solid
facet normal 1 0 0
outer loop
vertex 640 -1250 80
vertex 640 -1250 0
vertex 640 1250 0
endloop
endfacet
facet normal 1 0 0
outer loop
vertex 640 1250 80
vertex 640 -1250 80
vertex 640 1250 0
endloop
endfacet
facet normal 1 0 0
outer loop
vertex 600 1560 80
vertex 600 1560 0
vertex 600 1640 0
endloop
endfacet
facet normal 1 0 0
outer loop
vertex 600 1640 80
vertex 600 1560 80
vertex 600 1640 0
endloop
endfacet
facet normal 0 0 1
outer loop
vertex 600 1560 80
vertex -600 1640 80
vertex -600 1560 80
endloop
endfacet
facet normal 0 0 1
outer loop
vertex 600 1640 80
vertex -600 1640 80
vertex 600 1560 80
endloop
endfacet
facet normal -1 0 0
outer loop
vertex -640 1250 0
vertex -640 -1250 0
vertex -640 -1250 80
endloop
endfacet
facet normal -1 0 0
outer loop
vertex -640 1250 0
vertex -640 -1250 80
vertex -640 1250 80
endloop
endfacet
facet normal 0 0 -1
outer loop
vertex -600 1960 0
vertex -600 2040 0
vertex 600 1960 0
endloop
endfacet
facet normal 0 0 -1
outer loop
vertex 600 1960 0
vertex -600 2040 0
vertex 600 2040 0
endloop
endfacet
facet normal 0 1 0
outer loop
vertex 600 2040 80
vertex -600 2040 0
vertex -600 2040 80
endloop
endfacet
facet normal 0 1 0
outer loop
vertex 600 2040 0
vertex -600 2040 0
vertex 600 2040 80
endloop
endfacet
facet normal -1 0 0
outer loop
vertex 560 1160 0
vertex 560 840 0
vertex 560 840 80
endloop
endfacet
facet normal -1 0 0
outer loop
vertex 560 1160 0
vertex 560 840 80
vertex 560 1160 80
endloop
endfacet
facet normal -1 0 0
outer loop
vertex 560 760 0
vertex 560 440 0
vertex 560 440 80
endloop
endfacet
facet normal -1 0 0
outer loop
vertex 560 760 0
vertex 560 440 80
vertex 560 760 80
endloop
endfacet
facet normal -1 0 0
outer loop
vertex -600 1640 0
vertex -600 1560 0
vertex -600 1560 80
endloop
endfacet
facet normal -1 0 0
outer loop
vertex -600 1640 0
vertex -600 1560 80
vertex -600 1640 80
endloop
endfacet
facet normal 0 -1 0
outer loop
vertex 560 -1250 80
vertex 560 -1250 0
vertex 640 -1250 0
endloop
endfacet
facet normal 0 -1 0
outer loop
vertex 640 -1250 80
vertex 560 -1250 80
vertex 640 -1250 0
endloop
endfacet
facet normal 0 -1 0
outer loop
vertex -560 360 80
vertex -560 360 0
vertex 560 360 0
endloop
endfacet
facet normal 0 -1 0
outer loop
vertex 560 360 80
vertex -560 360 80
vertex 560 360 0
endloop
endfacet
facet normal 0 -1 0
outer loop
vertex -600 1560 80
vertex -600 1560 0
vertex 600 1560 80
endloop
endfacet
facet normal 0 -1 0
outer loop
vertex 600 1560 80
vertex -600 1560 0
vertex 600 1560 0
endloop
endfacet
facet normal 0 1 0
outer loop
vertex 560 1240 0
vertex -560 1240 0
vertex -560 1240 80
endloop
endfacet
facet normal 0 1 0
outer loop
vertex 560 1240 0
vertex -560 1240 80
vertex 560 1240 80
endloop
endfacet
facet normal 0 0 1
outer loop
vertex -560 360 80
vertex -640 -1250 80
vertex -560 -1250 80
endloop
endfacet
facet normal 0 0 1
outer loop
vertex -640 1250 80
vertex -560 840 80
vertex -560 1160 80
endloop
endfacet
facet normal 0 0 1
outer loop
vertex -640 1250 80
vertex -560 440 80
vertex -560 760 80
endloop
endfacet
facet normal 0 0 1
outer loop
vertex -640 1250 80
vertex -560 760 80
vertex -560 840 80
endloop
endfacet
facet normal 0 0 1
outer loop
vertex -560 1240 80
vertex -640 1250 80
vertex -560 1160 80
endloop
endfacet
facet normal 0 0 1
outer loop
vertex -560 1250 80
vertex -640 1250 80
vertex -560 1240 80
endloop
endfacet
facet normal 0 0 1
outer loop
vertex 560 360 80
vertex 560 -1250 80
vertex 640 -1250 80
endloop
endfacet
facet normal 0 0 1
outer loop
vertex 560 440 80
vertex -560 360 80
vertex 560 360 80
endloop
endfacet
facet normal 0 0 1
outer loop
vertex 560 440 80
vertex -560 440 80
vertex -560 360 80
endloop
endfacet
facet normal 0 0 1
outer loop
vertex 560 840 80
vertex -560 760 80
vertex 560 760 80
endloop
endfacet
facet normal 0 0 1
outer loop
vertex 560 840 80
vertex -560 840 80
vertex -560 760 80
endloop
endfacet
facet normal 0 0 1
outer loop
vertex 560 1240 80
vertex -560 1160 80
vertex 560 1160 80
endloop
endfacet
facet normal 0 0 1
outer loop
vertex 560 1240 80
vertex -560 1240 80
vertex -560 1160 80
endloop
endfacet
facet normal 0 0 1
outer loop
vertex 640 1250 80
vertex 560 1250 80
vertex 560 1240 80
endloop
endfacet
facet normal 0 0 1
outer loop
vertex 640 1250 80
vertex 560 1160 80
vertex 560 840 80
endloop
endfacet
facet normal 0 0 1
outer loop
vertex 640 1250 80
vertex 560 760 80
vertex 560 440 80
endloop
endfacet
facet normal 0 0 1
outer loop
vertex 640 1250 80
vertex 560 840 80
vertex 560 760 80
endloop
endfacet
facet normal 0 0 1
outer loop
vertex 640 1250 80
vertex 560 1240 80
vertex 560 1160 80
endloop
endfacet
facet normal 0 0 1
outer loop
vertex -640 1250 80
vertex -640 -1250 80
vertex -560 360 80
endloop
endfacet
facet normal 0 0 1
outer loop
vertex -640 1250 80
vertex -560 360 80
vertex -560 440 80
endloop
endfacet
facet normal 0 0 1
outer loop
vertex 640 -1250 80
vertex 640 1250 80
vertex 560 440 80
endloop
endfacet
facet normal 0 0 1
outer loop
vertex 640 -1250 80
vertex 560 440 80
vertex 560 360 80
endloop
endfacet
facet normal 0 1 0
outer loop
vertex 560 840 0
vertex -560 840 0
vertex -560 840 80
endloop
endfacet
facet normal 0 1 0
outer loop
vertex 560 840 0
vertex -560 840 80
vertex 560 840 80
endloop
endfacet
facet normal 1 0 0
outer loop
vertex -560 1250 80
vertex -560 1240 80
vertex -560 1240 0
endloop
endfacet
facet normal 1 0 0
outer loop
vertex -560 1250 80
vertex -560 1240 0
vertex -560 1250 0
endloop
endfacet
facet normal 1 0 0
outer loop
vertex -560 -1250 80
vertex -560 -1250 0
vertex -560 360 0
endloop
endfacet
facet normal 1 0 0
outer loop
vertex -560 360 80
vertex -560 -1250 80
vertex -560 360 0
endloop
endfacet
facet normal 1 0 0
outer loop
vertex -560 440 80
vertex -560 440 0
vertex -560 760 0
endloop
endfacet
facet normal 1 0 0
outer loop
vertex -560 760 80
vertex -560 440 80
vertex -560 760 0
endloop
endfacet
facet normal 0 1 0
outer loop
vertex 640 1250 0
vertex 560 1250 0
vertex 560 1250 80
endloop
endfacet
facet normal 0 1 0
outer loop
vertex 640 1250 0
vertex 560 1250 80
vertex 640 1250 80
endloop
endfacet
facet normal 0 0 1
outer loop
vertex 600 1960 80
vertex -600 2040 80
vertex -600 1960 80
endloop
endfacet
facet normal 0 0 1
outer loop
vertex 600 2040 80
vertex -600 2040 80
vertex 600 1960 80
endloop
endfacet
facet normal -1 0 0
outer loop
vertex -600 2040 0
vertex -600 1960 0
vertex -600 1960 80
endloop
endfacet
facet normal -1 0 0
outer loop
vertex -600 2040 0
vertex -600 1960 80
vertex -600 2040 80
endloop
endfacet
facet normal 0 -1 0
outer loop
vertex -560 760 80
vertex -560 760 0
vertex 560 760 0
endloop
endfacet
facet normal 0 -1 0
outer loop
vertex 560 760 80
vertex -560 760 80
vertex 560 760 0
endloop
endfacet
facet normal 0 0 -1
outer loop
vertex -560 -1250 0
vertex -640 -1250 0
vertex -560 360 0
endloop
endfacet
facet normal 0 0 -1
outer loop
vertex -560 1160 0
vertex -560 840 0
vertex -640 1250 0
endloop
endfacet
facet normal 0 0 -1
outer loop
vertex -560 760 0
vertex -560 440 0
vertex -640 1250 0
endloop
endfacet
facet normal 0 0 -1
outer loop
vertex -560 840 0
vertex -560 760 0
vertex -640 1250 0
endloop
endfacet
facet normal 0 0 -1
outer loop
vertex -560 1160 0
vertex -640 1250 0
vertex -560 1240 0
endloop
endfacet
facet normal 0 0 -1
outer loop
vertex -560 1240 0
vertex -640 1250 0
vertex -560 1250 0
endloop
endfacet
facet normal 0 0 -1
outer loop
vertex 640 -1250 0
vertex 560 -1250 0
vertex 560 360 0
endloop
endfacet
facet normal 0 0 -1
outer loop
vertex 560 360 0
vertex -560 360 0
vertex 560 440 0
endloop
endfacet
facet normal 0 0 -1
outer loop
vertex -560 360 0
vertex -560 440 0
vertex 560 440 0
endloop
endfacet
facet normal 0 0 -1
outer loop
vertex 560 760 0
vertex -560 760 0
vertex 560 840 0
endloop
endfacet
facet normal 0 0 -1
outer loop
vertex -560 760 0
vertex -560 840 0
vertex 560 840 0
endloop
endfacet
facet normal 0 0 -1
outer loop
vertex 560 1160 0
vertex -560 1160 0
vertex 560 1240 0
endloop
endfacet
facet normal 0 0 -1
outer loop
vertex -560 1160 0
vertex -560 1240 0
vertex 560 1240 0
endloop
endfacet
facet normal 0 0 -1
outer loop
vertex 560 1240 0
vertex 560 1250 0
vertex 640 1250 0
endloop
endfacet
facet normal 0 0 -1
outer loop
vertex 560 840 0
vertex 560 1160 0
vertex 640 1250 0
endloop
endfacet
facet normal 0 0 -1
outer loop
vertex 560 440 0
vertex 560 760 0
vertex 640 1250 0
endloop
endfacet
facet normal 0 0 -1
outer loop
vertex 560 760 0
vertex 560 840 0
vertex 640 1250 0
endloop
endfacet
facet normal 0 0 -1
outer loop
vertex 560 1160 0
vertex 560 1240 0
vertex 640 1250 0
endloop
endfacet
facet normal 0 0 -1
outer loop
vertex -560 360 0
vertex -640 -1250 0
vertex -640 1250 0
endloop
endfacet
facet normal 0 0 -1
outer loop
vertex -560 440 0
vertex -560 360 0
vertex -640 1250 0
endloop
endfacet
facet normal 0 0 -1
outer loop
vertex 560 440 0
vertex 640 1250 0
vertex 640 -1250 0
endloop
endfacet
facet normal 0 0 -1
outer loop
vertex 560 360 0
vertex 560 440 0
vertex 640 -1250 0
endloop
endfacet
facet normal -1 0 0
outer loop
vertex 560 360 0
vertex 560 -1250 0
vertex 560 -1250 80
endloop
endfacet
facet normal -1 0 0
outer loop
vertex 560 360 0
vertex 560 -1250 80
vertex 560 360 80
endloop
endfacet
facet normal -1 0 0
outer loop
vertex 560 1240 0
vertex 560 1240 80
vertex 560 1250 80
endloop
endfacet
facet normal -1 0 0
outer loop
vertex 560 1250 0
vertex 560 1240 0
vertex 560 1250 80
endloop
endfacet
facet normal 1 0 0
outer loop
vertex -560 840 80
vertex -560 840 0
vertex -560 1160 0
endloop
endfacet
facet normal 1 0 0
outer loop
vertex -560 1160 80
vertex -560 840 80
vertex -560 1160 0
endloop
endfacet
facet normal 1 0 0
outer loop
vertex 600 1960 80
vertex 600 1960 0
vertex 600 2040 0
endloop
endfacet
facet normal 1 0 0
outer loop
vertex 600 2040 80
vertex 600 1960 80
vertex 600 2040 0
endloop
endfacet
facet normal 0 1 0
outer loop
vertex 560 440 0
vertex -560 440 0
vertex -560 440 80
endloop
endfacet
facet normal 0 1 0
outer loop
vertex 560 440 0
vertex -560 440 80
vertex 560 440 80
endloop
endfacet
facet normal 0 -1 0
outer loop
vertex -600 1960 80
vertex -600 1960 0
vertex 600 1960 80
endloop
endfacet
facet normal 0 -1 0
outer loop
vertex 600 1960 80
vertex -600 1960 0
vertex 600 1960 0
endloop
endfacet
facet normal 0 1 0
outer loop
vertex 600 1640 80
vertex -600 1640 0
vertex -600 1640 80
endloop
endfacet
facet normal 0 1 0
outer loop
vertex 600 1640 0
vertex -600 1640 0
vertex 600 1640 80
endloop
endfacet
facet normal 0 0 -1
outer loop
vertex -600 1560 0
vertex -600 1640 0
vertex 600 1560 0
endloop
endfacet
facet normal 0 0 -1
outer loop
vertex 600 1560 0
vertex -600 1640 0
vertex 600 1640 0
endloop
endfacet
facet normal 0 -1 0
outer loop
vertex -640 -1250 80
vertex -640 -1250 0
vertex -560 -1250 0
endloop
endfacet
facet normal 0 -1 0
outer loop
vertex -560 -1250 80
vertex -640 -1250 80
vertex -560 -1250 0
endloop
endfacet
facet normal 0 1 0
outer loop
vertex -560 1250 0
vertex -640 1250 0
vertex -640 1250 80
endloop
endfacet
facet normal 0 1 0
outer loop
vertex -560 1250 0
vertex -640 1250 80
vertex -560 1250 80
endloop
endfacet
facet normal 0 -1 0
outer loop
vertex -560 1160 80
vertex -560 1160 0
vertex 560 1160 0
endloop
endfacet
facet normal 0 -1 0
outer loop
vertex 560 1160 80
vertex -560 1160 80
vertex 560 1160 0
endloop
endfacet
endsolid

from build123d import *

# Parameters (mm, degrees)
SKETCH_1_W      = 80
SKETCH_1_H      = 2500
EXTRUDE_1_DEPTH = 80
SKETCH_2_W      = 80
SKETCH_2_H      = 2500
EXTRUDE_2_DEPTH = 80
SKETCH_3_W      = 1200
SKETCH_3_H      = 80
EXTRUDE_3_DEPTH = 80
SKETCH_4_W      = 1200
SKETCH_4_H      = 80
EXTRUDE_4_DEPTH = 80
SKETCH_5_W      = 1200
SKETCH_5_H      = 80
EXTRUDE_5_DEPTH = 80
SKETCH_6_W      = 1200
SKETCH_6_H      = 80
EXTRUDE_6_DEPTH = 80
SKETCH_7_W      = 1200
SKETCH_7_H      = 80
EXTRUDE_7_DEPTH = 80


with BuildPart() as part:
    # 草图1 → 凸台-拉伸1 (new body)
    with BuildSketch(Plane.XY):
        with Locations((-600, 0)):
            Rectangle(SKETCH_1_W, SKETCH_1_H)
    extrude(amount=EXTRUDE_1_DEPTH)



with BuildPart() as body_2:
    # 草图2 → 凸台-拉伸2 (new body)
    with BuildSketch(Plane.XY):
        with Locations((600, 0)):
            Rectangle(SKETCH_2_W, SKETCH_2_H)
    extrude(amount=EXTRUDE_2_DEPTH)


with BuildPart() as part_1:
    add(part.part)

    add(body_2.part)  # 凸台-拉伸3 merges body 2
    # 草图3 → 凸台-拉伸3 (add)
    with BuildSketch(Plane.XY):
        with Locations((0, 400)):
            Rectangle(SKETCH_3_W, SKETCH_3_H)
    extrude(amount=EXTRUDE_3_DEPTH)

    # 草图4 → 凸台-拉伸4 (add)
    with BuildSketch(Plane.XY):
        with Locations((0, 800)):
            Rectangle(SKETCH_4_W, SKETCH_4_H)
    extrude(amount=EXTRUDE_4_DEPTH)

    # 草图5 → 凸台-拉伸5 (add)
    with BuildSketch(Plane.XY):
        with Locations((0, 1200)):
            Rectangle(SKETCH_5_W, SKETCH_5_H)
    extrude(amount=EXTRUDE_5_DEPTH)


with BuildPart() as body_2_2:
    # 草图6 → 凸台-拉伸6 (new body)
    with BuildSketch(Plane.XY):
        with Locations((0, 1600)):
            Rectangle(SKETCH_6_W, SKETCH_6_H)
    extrude(amount=EXTRUDE_6_DEPTH)


with BuildPart() as body_3:
    # 草图7 → 凸台-拉伸7 (new body)
    with BuildSketch(Plane.XY):
        with Locations((0, 2000)):
            Rectangle(SKETCH_7_W, SKETCH_7_H)
    extrude(amount=EXTRUDE_7_DEPTH)


solid = Compound([part_1.part, body_2_2.part, body_3.part])
